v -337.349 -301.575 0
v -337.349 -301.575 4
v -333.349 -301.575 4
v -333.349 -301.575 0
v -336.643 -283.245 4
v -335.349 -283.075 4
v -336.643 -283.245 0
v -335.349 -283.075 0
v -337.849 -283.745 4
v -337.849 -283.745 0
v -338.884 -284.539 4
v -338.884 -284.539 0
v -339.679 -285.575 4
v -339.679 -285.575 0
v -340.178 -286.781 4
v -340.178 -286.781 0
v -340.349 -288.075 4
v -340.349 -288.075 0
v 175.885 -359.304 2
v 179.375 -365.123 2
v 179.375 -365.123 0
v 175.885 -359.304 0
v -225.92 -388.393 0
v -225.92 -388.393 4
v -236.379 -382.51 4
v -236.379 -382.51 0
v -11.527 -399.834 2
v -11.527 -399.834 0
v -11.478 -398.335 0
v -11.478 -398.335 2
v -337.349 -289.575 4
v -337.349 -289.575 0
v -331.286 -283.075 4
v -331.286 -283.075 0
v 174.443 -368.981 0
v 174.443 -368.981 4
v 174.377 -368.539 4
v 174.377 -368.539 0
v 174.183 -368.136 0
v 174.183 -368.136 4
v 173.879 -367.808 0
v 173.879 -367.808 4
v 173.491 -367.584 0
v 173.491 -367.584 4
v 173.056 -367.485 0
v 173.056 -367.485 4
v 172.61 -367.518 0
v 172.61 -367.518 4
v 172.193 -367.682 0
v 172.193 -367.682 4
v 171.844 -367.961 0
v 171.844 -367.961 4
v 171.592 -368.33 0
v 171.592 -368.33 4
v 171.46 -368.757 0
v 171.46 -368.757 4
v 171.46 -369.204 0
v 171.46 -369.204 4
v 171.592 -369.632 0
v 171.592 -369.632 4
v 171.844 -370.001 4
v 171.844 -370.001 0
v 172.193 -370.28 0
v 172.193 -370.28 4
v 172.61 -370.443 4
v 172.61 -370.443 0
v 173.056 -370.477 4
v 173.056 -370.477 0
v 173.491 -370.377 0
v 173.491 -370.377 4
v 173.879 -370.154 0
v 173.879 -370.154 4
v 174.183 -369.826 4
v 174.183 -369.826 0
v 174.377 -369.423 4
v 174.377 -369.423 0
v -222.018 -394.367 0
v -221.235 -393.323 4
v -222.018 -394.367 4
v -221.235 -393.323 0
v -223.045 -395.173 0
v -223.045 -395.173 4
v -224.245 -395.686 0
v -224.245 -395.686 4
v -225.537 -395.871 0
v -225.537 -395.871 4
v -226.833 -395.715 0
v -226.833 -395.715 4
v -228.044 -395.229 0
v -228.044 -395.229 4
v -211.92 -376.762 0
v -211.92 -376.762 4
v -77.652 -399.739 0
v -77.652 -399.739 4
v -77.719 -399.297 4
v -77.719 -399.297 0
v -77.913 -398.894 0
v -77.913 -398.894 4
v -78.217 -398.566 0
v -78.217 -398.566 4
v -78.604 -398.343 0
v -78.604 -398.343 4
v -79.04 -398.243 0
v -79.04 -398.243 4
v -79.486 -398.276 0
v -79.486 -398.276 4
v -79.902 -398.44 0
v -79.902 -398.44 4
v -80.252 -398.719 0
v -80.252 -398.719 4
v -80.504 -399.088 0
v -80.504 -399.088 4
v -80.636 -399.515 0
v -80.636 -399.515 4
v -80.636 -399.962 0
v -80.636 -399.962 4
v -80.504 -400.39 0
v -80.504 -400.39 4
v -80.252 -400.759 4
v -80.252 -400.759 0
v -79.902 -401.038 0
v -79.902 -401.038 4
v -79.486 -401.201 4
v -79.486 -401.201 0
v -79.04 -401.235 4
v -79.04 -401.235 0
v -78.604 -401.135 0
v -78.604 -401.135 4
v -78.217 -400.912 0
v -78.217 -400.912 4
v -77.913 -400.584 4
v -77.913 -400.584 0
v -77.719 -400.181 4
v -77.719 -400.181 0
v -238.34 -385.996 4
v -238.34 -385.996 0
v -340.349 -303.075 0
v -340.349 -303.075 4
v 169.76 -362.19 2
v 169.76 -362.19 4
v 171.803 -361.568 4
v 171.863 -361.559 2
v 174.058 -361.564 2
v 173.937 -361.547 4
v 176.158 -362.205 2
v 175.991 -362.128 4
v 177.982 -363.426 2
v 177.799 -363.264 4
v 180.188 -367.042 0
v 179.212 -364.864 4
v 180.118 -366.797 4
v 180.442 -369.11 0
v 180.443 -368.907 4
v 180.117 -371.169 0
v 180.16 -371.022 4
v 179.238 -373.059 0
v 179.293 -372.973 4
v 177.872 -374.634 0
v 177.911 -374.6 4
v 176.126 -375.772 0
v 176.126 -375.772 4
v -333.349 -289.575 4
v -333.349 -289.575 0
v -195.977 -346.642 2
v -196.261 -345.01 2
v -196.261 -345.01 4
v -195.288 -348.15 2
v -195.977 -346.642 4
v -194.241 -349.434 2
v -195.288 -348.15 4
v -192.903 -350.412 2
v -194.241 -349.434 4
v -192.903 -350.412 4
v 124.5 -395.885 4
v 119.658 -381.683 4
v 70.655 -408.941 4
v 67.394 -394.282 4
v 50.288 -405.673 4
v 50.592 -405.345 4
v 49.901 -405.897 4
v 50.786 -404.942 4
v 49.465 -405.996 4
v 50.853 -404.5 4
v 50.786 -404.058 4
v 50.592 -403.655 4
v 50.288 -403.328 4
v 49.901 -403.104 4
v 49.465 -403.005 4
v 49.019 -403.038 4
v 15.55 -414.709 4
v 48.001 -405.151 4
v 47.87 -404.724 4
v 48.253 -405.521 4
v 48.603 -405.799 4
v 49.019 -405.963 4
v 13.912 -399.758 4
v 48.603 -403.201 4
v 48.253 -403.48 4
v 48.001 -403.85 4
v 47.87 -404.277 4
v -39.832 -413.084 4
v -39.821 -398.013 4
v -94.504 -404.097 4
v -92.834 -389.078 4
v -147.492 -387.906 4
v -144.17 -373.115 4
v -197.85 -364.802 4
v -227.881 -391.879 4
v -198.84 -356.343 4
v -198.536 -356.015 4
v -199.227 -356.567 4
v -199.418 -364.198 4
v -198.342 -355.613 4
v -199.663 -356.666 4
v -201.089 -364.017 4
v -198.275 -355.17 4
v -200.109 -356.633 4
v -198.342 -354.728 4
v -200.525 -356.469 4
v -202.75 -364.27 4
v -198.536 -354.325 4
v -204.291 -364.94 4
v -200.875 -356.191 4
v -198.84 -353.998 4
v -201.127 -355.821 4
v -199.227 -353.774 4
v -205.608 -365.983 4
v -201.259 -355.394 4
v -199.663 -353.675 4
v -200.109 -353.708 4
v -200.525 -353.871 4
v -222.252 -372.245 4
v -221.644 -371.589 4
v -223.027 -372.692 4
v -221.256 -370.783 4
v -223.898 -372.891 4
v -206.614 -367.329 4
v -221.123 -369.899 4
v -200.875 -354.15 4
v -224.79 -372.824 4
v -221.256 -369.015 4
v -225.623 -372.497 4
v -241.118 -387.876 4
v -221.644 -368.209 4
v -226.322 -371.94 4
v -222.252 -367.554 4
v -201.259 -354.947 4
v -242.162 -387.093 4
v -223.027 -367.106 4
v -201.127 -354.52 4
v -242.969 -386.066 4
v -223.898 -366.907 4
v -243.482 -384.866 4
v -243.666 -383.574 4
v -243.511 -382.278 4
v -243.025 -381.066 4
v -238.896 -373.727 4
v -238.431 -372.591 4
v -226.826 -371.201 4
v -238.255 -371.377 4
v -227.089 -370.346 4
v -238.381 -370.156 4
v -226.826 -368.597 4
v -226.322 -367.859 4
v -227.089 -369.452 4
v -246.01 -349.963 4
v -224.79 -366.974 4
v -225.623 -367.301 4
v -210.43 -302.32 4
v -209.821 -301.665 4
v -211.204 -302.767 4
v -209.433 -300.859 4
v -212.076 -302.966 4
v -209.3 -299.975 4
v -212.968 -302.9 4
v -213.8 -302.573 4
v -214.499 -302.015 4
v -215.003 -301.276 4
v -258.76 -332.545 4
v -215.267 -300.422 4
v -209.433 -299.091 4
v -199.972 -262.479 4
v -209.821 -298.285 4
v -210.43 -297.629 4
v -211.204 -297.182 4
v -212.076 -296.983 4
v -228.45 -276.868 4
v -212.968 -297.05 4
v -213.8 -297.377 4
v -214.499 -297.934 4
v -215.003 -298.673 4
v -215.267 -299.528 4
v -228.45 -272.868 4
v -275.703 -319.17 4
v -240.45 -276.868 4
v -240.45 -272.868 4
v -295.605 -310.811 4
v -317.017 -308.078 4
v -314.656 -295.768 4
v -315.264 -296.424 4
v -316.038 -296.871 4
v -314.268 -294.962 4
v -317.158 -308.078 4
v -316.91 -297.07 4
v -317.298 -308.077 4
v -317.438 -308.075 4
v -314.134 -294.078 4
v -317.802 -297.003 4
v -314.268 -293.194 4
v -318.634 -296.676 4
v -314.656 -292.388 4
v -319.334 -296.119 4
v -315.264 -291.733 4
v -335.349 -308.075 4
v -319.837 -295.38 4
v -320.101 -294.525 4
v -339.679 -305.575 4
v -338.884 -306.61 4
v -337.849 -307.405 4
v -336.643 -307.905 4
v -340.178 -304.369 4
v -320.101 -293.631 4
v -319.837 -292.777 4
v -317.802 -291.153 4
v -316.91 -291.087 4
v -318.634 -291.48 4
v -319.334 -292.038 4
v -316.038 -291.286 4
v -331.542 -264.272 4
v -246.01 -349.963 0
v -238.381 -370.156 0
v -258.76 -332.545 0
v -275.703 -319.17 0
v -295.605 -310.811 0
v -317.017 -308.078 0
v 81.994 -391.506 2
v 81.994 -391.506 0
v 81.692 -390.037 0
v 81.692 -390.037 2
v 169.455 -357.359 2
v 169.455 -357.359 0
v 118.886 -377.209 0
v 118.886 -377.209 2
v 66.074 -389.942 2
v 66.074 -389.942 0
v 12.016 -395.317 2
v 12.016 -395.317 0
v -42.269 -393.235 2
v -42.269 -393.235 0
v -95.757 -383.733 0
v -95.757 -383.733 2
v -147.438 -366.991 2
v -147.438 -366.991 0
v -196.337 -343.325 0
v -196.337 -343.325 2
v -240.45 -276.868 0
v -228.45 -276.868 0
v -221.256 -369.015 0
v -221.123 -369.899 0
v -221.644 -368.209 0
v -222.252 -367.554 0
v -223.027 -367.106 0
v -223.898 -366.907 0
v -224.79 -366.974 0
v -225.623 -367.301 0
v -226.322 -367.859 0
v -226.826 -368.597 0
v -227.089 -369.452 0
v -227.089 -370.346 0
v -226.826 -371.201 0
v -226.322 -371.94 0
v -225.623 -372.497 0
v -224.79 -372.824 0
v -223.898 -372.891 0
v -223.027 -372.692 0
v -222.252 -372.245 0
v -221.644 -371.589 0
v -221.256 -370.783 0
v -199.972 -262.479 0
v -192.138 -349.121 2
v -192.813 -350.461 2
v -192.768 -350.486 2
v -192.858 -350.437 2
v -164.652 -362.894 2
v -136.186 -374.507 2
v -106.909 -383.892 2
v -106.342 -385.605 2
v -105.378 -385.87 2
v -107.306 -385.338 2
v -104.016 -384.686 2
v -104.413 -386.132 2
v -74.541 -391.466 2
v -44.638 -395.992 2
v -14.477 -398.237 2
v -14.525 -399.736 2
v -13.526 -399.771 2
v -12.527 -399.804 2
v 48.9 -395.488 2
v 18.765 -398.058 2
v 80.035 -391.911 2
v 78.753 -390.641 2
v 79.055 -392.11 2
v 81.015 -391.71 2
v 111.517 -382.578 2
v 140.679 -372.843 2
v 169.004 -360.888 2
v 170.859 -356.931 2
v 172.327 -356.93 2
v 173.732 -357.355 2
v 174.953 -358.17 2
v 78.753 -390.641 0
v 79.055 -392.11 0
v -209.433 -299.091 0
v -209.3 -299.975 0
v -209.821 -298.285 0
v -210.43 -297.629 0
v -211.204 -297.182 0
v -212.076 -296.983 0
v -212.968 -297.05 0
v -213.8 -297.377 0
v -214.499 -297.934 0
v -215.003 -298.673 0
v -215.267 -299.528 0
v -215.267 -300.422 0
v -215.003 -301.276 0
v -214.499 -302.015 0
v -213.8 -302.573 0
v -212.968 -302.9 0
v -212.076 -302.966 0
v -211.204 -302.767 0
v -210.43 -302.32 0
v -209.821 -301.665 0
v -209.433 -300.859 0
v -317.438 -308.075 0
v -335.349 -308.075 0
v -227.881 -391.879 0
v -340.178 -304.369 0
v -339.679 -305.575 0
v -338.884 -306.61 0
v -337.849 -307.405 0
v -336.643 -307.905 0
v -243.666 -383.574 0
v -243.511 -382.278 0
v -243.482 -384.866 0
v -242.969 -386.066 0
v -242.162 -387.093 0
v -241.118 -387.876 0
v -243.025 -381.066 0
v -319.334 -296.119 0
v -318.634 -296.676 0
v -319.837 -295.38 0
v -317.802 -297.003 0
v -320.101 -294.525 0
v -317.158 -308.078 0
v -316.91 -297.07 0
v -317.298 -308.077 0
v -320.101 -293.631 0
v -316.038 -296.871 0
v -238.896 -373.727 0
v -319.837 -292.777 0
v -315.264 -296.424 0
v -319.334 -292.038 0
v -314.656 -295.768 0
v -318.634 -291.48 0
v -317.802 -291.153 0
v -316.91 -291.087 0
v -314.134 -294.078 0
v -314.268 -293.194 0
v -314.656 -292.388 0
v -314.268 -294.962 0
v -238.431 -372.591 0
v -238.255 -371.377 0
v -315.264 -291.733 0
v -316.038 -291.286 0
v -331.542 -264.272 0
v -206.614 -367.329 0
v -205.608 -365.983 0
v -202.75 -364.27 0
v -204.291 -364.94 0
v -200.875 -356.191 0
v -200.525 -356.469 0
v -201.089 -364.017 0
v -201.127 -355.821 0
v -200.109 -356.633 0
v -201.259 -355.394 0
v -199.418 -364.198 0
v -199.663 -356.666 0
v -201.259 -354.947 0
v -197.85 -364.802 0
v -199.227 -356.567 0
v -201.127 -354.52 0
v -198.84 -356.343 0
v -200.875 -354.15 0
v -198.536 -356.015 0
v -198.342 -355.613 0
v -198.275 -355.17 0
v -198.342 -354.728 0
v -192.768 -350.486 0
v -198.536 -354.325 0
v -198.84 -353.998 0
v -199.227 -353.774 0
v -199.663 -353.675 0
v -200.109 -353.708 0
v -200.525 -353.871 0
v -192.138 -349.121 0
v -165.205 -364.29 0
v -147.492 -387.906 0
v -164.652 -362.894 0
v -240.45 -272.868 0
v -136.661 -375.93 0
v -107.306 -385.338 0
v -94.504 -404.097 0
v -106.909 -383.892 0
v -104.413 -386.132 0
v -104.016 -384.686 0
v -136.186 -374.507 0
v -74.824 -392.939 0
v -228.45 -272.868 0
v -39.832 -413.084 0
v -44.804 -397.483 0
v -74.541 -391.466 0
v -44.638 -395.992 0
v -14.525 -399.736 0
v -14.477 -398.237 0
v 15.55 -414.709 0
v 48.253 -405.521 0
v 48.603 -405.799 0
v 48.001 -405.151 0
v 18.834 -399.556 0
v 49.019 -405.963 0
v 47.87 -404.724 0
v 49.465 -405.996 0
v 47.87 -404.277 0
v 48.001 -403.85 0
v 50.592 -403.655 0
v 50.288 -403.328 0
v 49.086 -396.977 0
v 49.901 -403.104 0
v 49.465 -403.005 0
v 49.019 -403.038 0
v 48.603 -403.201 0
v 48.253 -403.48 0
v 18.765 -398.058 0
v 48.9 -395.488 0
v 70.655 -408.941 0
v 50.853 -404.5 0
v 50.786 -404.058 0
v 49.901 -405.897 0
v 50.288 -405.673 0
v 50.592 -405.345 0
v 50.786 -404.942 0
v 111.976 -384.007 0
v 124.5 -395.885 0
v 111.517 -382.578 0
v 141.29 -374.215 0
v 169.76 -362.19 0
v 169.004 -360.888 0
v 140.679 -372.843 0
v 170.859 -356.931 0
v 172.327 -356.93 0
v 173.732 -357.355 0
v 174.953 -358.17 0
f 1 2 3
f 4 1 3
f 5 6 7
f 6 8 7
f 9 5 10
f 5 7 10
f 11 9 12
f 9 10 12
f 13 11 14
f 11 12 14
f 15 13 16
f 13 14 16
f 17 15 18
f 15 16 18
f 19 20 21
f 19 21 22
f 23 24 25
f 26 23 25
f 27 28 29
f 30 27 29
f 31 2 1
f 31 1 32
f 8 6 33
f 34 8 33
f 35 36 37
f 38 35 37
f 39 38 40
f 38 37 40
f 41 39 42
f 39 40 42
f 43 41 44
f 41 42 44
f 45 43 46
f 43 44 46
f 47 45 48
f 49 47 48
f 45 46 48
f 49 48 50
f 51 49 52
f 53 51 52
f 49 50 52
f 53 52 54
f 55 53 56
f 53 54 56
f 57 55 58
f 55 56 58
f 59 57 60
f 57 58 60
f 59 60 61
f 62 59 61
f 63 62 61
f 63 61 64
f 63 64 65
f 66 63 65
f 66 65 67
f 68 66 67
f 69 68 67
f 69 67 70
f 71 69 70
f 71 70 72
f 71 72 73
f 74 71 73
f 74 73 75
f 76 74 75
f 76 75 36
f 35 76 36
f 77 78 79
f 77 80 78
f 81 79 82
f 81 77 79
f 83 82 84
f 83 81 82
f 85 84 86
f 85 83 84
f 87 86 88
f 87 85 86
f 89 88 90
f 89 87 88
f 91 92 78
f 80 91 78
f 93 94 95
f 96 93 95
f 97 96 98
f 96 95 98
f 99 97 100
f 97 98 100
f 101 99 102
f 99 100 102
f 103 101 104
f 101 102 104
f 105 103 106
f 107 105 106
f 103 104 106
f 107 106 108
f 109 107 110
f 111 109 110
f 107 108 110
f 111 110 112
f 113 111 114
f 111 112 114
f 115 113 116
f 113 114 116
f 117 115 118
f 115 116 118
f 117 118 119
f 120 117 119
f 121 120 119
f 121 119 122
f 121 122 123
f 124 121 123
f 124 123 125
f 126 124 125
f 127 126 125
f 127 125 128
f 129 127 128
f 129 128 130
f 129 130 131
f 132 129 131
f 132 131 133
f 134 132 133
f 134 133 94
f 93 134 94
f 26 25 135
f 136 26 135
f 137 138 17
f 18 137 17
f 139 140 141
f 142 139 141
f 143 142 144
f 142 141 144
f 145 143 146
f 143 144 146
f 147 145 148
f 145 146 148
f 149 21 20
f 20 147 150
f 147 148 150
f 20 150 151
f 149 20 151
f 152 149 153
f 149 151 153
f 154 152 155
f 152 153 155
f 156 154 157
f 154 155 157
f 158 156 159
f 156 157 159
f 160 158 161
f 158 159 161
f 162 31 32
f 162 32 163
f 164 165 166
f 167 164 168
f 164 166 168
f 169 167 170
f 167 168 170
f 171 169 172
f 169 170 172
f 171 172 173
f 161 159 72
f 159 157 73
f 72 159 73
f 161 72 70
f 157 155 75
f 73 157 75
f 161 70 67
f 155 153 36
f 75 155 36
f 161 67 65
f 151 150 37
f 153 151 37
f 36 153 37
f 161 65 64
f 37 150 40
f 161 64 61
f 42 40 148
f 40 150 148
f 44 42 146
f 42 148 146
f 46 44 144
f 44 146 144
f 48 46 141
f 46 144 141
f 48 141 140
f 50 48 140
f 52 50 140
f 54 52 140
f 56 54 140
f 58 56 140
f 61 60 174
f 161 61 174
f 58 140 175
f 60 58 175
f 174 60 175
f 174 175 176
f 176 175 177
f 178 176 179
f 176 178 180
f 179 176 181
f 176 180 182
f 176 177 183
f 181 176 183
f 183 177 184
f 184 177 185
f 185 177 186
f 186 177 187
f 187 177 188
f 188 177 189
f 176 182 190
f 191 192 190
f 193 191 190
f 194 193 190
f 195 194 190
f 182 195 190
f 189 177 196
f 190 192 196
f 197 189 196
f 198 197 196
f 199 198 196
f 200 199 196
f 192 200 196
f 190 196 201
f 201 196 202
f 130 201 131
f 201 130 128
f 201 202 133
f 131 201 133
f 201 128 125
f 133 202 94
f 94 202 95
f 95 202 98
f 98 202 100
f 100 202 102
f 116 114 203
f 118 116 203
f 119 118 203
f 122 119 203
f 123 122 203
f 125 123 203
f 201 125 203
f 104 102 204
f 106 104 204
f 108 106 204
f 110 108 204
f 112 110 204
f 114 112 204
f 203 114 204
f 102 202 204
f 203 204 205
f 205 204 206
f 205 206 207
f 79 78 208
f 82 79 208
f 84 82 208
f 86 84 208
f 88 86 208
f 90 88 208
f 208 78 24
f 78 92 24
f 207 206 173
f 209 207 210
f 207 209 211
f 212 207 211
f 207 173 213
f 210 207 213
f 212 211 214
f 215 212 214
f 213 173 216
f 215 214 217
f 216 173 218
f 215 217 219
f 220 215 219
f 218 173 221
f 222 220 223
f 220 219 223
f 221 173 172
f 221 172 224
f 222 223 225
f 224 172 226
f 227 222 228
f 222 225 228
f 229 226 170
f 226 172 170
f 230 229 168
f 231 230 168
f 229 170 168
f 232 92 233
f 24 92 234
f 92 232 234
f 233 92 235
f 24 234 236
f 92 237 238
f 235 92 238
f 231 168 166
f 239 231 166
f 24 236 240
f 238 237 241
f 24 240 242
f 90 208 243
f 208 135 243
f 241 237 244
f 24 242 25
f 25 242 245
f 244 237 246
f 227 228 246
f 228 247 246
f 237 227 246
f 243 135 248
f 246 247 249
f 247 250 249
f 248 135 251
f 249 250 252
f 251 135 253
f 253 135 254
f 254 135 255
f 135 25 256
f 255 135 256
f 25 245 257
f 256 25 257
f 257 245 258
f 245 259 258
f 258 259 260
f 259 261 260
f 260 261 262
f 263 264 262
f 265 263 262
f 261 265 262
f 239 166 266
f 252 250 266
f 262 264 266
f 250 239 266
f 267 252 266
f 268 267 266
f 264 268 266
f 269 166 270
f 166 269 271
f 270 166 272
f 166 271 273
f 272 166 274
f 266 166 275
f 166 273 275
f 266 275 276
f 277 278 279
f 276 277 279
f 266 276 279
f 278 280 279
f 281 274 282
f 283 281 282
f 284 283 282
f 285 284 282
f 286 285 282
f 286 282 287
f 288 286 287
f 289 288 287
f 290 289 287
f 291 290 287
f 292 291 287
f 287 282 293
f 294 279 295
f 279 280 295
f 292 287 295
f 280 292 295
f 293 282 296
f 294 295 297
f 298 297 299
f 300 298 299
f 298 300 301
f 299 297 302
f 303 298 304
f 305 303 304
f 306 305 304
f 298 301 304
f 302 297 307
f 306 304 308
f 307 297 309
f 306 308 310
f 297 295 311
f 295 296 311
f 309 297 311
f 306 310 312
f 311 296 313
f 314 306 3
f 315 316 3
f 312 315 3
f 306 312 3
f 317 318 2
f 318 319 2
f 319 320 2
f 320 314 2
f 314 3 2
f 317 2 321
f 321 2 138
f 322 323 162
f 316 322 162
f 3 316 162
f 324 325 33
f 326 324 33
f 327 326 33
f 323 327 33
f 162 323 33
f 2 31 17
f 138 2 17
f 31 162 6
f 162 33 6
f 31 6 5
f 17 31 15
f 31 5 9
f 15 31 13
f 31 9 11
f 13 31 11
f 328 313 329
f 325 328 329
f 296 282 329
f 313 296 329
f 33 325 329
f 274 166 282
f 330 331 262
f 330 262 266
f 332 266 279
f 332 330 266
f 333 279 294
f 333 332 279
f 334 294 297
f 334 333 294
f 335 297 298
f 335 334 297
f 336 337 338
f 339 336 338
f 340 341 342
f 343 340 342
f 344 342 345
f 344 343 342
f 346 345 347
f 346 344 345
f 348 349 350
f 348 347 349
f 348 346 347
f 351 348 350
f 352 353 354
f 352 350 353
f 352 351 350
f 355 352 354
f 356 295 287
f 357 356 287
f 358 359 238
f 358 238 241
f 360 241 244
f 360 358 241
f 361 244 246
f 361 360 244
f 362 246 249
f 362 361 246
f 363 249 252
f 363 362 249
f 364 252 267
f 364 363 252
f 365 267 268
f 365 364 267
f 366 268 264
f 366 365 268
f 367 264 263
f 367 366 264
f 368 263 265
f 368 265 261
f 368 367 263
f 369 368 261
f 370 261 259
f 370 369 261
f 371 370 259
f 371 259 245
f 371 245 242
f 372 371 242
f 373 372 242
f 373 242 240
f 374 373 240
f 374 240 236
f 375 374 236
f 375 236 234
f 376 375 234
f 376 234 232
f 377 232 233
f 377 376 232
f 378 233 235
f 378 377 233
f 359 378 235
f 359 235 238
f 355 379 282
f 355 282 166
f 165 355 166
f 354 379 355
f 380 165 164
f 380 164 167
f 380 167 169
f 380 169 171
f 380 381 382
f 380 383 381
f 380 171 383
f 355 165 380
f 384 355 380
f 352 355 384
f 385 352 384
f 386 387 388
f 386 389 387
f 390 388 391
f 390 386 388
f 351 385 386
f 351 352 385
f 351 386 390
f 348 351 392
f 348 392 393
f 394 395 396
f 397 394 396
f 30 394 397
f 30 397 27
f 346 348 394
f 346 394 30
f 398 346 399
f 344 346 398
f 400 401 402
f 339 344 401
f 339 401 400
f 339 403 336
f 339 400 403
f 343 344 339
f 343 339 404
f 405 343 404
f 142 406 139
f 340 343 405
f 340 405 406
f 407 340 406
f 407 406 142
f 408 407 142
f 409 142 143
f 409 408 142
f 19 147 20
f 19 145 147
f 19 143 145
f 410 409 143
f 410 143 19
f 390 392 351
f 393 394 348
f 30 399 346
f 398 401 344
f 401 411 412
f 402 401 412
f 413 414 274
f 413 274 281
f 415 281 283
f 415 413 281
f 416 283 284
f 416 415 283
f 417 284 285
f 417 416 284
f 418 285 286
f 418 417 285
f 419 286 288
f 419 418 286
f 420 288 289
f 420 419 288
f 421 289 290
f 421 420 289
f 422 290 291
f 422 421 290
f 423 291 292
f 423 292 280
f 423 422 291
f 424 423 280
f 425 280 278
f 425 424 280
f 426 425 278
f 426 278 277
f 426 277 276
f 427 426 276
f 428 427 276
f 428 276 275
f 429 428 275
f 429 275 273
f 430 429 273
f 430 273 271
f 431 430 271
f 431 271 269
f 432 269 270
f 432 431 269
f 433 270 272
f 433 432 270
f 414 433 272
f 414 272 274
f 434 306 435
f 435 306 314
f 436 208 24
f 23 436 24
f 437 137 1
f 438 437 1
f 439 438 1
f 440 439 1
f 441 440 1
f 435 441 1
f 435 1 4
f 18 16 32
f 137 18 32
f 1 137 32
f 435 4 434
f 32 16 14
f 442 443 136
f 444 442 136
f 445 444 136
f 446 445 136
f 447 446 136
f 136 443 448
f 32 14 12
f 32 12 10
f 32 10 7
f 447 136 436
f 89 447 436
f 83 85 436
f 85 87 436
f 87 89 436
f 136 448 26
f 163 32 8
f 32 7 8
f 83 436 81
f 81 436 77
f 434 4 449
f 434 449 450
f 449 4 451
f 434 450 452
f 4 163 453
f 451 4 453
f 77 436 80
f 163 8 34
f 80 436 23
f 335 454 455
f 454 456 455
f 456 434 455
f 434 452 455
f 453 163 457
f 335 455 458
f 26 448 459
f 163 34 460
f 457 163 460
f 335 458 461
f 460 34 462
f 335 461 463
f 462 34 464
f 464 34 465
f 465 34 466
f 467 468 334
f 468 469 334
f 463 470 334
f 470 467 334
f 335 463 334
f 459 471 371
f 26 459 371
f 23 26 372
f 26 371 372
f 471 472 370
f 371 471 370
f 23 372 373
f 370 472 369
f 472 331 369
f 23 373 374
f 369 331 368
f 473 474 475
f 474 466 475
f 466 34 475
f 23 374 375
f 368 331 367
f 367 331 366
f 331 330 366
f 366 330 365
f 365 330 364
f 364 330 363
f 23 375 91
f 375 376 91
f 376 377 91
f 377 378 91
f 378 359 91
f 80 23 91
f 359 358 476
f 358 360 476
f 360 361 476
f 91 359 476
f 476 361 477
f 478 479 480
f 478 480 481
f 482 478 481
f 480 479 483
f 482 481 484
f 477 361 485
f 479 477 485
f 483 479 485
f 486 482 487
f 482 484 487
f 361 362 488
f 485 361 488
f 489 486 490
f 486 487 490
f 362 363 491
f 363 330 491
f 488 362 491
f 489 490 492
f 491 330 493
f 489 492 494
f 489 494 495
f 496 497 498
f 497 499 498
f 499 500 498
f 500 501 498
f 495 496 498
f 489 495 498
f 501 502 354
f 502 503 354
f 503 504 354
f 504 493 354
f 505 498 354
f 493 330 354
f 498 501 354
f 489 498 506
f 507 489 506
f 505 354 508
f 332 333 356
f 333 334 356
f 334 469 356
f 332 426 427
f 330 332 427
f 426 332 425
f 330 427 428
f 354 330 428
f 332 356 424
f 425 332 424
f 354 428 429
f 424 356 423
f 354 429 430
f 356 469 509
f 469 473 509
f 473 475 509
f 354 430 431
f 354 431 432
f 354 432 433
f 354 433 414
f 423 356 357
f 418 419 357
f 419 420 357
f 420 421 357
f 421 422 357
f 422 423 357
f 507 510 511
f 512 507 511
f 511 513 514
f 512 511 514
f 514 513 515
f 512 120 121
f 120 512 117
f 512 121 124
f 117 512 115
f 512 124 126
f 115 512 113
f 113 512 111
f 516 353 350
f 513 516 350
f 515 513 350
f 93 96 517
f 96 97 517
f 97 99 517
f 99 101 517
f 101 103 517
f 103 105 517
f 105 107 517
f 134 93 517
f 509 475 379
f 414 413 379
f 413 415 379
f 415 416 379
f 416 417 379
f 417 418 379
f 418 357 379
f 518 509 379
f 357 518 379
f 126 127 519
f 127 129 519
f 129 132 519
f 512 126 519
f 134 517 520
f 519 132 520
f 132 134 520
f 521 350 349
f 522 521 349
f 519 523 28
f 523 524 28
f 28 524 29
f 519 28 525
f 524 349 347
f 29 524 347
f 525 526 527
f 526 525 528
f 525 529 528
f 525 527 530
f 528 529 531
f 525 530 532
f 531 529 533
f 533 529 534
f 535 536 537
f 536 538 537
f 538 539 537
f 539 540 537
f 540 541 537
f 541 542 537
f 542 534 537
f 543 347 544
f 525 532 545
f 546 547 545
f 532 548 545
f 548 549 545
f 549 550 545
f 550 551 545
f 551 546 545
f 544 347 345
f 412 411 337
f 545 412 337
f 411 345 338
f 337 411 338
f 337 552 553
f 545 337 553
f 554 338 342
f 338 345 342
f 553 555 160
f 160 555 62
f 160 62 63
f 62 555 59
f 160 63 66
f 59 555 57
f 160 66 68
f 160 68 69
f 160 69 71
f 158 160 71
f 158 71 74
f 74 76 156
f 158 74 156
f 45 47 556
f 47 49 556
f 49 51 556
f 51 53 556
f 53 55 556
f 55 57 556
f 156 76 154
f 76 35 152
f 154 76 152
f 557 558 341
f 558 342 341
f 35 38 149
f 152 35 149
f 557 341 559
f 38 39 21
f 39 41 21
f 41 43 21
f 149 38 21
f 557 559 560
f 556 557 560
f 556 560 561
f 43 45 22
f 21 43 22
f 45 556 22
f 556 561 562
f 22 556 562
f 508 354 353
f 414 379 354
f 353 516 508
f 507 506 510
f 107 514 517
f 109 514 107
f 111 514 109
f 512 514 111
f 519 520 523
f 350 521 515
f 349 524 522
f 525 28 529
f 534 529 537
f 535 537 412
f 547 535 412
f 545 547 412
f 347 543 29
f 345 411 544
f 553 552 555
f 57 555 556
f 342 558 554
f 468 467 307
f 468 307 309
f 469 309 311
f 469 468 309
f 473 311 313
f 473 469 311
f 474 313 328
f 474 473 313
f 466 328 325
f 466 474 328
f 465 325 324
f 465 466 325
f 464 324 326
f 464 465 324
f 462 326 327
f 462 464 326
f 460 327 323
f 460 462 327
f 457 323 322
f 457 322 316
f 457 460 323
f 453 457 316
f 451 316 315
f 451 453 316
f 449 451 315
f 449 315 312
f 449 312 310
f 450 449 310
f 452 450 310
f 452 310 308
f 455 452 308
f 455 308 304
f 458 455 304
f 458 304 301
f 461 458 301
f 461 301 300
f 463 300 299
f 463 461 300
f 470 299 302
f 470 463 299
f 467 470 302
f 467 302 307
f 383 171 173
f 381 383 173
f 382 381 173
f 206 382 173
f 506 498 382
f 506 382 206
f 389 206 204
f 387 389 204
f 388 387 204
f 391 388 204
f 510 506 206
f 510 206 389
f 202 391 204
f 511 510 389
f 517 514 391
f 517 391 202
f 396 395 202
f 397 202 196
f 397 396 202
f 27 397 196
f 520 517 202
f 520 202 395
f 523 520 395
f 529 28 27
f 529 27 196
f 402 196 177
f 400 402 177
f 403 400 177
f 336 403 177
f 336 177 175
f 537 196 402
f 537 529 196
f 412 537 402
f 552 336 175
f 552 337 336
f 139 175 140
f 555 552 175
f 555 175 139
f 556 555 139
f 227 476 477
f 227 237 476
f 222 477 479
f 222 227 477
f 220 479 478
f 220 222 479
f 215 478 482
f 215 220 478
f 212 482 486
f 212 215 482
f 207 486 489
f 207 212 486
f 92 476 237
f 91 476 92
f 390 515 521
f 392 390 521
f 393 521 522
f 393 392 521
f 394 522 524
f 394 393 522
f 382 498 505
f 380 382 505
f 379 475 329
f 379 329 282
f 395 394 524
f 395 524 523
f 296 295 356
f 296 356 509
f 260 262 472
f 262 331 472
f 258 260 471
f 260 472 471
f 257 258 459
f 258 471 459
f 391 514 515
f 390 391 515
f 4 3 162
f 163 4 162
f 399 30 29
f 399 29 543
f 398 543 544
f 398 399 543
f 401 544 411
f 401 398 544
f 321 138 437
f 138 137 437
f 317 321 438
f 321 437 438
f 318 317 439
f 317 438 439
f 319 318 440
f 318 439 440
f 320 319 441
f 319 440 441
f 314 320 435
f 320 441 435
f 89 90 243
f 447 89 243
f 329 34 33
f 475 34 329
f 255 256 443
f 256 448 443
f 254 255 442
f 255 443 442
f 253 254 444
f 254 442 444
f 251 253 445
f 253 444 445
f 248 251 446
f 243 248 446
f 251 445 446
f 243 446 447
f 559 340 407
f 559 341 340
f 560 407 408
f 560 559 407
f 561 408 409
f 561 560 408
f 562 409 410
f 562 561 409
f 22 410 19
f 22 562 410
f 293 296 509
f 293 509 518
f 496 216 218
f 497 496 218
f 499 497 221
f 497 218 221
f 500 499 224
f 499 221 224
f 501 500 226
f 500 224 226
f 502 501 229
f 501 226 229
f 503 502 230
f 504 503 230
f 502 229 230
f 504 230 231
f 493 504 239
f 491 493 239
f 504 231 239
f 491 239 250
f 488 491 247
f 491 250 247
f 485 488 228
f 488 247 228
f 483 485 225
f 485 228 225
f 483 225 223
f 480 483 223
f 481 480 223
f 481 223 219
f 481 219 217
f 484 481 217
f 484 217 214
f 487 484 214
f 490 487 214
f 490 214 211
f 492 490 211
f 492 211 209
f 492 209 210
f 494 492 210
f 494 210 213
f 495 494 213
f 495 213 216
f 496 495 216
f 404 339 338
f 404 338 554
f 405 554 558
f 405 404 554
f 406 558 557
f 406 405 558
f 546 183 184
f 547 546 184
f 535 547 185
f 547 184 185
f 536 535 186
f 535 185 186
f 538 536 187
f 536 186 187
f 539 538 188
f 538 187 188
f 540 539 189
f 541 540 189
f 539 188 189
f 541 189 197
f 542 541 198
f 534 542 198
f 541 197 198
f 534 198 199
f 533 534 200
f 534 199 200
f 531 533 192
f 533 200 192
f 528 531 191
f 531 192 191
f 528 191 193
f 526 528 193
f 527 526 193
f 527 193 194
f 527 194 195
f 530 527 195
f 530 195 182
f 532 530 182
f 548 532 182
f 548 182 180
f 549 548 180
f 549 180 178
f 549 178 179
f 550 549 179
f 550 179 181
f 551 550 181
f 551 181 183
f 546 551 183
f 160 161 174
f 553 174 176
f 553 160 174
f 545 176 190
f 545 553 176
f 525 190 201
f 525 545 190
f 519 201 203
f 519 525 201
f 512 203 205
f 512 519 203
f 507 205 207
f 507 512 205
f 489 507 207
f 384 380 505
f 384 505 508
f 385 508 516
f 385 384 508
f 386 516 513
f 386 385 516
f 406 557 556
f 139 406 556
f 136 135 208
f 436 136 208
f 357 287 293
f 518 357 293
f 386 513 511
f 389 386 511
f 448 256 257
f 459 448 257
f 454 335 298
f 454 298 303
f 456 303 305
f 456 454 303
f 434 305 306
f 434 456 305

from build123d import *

# Parameters (mm, degrees)
ESQUISSE2_R             = 3
BOSS_EXTRU_1_DEPTH      = 4
ESQUISSE3_R             = 1.5
ENL_V_MAT_EXTRU_1_DEPTH = 5
CONG_1_R                = 6.5
ESQUISSE4_W             = 4
ESQUISSE4_H             = 12
BOSS_EXTRU_2_DEPTH      = 4
CONG_2_R                = 5
ESQUISSE5_W             = 12
ESQUISSE5_H             = 4
ENL_V_MAT_EXTRU_2_DEPTH = 4
BOSS_EXTRU_3_START      = -2
BOSS_EXTRU_3_DEPTH      = 2
CONG_3_R                = 5
BOSS_EXTRU_4_DEPTH      = 2


with BuildPart() as part:
    # Esquisse2 → Boss.-Extru.1 (new body)
    with BuildSketch(Plane.XY):
        with BuildLine():
            Line((-199.971644797, -262.478940861), (-196.098548459, -348.633560192))
            ThreePointArc((-196.098548459, -348.633560192), (-8.923258694, -399.900456932), (180.352503917, -357.033575915))
            Line((180.352503917, -357.033575915), (187.115722814, -370.422335012))
            ThreePointArc((187.115722814, -370.422335012), (-9.257880895, -414.896724067), (-203.452244027, -361.707318699))
            Line((-203.452244027, -361.707318699), (-211.920441681, -376.762493353))
            ThreePointArc((-211.920441681, -376.762493353), (-226.337772202, -383.722686379), (-237.858405423, -372.606089933))
            ThreePointArc((-237.858405423, -372.606089933), (-265.801404699, -326.067035455), (-317.01741072, -308.077718418))
            ThreePointArc((-317.01741072, -308.077718418), (-326.924525304, -304.085923492), (-331.133147983, -294.268956483))
            Line((-331.133147983, -294.268956483), (-331.541895531, -264.271741188))
            Line((-331.541895531, -264.271741188), (-199.971644797, -262.478940861))
        make_face()
        with Locations((-317.134447512, -294.078207627)):
            Circle(ESQUISSE2_R, mode=Mode.SUBTRACT)
        with Locations((-212.300150205, -299.974825982)):
            Circle(ESQUISSE2_R, mode=Mode.SUBTRACT)
        with Locations((-224.122616287, -369.899044157)):
            Circle(ESQUISSE2_R, mode=Mode.SUBTRACT)
    extrude(amount=BOSS_EXTRU_1_DEPTH)

    # Esquisse3 → Enlèv. mat.-Extru.1 (cut, through all)
    with BuildSketch(Plane.XY.offset(4)):
        with BuildLine():
            ThreePointArc((180.352503917, -357.033575915), (175.075442806, -359.650649), (169.760416098, -362.18973084))
            ThreePointArc((169.760416098, -362.18973084), (179.734481353, -365.797780492), (176.126431702, -375.771845747))
            ThreePointArc((176.126431702, -375.771845747), (181.640771911, -373.137548338), (187.115722814, -370.422335012))
            Line((187.115722814, -370.422335012), (180.352503917, -357.033575915))
        make_face()
        with Locations((172.9434239, -368.980788294)):
            Circle(ESQUISSE3_R)
        with Locations((49.352874806, -404.5003631)):
            Circle(ESQUISSE3_R)
        with Locations((-79.152347286, -399.738859656)):
            Circle(ESQUISSE3_R)
        with Locations((-199.775396243, -355.170439446)):
            Circle(ESQUISSE3_R)
    extrude(amount=-ENL_V_MAT_EXTRU_1_DEPTH, mode=Mode.SUBTRACT)

    # Congé1
    cong_1_edges = [part.edges().sort_by_distance(p)[0] for p in [
        (-203.452244027, -361.707318699, 2),
        (-196.098548459, -348.633560192, 2),
    ]]
    fillet(cong_1_edges, radius=CONG_1_R)

    # Esquisse4 → Boss.-Extru.2 (add)
    with BuildSketch(Plane.XY.offset(4)):
        Polygon((-211.920441681, -376.762493353), (-223.686354588, -397.680506965), (-245.4759521, -385.424347686), (-237.96555462, -372.071996878), (-225.374330656, -376.762493353), align=None)
        Polygon((-238.339917634, -385.996197397), (-227.880910828, -391.879153851), (-225.919925343, -388.392818249), (-236.378932149, -382.509861795), align=None, mode=Mode.SUBTRACT)
        Polygon((-316.348629052, -308.074922938), (-340.348629052, -308.074922938), (-340.348629052, -283.074922938), (-331.285679934, -283.074922938), align=None)
        with Locations((-335.348629052, -295.574922938)):
            Rectangle(ESQUISSE4_W, ESQUISSE4_H, mode=Mode.SUBTRACT)
    extrude(amount=-BOSS_EXTRU_2_DEPTH)

    # Congé2
    cong_2_edges = [part.edges().sort_by_distance(p)[0] for p in [
        (-340.348629052, -308.074922938, 2),
        (-340.348629052, -283.074922938, 2),
        (-223.686354588, -397.680506965, 2),
        (-245.4759521, -385.424347686, 2),
        (-237.96555462, -372.071996878, 2),
    ]]
    fillet(cong_2_edges, radius=CONG_2_R)

    # Esquisse5 → Enlèv. mat.-Extru.2 (cut)
    with BuildSketch(Plane.XY.offset(4)):
        with Locations((-234.450045065, -274.867921079)):
            Rectangle(ESQUISSE5_W, ESQUISSE5_H)
    extrude(amount=-ENL_V_MAT_EXTRU_2_DEPTH, mode=Mode.SUBTRACT)

    # Esquisse6 → Boss.-Extru.3 (add)
    with BuildSketch(Plane.XY.offset(4).offset(BOSS_EXTRU_3_START)):
        with BuildLine():
            Line((169.003770429, -360.887760364), (169.760416098, -362.18973084))
            Line((169.760416098, -362.18973084), (178.042128837, -365.922078374))
            Line((178.042128837, -365.922078374), (179.374906332, -365.122545984))
            Line((179.374906332, -365.122545984), (173.538532023, -355.393623893))
            ThreePointArc((173.538532023, -355.393623893), (-12.898010177, -395.289629681), (-196.337202457, -343.324850443))
            Line((-196.337202457, -343.324850443), (-200.18270603, -348.6233841))
            Line((-200.18270603, -348.6233841), (-194.097457315, -353.368142853))
            Line((-194.097457315, -353.368142853), (-192.138010837, -349.120659359))
            ThreePointArc((-192.138010837, -349.120659359), (-12.977458778, -398.288633485), (169.003770429, -360.887760364))
        make_face()
    extrude(amount=-BOSS_EXTRU_3_DEPTH)

    # Congé3
    cong_3_edges = [part.edges().sort_by_distance(p)[0] for p in [
        (173.538532023, -355.393623893, 1),
    ]]
    fillet(cong_3_edges, radius=CONG_3_R)

    # Esquisse8 → Boss.-Extru.4 (add)
    with BuildSketch(Plane(origin=(0, 0, 0), x_dir=(-1, 0, 0), z_dir=(0, 0, -1))):
        Polygon((11.706214766, -405.333769301), (11.38055708, -395.339073354), (14.378965864, -395.241376048), (14.70462355, -405.236071995), align=None)
        Polygon((-83.101661868, -396.896225473), (-81.088533104, -387.100955565), (-78.149952132, -387.704894194), (-80.163080896, -397.500164102), align=None)
        Polygon((105.869114928, -391.438667615), (103.22261353, -381.795222673), (106.115647013, -381.001272254), (108.76214841, -390.644717196), align=None)
    extrude(amount=-BOSS_EXTRU_4_DEPTH)


solid = part.part
